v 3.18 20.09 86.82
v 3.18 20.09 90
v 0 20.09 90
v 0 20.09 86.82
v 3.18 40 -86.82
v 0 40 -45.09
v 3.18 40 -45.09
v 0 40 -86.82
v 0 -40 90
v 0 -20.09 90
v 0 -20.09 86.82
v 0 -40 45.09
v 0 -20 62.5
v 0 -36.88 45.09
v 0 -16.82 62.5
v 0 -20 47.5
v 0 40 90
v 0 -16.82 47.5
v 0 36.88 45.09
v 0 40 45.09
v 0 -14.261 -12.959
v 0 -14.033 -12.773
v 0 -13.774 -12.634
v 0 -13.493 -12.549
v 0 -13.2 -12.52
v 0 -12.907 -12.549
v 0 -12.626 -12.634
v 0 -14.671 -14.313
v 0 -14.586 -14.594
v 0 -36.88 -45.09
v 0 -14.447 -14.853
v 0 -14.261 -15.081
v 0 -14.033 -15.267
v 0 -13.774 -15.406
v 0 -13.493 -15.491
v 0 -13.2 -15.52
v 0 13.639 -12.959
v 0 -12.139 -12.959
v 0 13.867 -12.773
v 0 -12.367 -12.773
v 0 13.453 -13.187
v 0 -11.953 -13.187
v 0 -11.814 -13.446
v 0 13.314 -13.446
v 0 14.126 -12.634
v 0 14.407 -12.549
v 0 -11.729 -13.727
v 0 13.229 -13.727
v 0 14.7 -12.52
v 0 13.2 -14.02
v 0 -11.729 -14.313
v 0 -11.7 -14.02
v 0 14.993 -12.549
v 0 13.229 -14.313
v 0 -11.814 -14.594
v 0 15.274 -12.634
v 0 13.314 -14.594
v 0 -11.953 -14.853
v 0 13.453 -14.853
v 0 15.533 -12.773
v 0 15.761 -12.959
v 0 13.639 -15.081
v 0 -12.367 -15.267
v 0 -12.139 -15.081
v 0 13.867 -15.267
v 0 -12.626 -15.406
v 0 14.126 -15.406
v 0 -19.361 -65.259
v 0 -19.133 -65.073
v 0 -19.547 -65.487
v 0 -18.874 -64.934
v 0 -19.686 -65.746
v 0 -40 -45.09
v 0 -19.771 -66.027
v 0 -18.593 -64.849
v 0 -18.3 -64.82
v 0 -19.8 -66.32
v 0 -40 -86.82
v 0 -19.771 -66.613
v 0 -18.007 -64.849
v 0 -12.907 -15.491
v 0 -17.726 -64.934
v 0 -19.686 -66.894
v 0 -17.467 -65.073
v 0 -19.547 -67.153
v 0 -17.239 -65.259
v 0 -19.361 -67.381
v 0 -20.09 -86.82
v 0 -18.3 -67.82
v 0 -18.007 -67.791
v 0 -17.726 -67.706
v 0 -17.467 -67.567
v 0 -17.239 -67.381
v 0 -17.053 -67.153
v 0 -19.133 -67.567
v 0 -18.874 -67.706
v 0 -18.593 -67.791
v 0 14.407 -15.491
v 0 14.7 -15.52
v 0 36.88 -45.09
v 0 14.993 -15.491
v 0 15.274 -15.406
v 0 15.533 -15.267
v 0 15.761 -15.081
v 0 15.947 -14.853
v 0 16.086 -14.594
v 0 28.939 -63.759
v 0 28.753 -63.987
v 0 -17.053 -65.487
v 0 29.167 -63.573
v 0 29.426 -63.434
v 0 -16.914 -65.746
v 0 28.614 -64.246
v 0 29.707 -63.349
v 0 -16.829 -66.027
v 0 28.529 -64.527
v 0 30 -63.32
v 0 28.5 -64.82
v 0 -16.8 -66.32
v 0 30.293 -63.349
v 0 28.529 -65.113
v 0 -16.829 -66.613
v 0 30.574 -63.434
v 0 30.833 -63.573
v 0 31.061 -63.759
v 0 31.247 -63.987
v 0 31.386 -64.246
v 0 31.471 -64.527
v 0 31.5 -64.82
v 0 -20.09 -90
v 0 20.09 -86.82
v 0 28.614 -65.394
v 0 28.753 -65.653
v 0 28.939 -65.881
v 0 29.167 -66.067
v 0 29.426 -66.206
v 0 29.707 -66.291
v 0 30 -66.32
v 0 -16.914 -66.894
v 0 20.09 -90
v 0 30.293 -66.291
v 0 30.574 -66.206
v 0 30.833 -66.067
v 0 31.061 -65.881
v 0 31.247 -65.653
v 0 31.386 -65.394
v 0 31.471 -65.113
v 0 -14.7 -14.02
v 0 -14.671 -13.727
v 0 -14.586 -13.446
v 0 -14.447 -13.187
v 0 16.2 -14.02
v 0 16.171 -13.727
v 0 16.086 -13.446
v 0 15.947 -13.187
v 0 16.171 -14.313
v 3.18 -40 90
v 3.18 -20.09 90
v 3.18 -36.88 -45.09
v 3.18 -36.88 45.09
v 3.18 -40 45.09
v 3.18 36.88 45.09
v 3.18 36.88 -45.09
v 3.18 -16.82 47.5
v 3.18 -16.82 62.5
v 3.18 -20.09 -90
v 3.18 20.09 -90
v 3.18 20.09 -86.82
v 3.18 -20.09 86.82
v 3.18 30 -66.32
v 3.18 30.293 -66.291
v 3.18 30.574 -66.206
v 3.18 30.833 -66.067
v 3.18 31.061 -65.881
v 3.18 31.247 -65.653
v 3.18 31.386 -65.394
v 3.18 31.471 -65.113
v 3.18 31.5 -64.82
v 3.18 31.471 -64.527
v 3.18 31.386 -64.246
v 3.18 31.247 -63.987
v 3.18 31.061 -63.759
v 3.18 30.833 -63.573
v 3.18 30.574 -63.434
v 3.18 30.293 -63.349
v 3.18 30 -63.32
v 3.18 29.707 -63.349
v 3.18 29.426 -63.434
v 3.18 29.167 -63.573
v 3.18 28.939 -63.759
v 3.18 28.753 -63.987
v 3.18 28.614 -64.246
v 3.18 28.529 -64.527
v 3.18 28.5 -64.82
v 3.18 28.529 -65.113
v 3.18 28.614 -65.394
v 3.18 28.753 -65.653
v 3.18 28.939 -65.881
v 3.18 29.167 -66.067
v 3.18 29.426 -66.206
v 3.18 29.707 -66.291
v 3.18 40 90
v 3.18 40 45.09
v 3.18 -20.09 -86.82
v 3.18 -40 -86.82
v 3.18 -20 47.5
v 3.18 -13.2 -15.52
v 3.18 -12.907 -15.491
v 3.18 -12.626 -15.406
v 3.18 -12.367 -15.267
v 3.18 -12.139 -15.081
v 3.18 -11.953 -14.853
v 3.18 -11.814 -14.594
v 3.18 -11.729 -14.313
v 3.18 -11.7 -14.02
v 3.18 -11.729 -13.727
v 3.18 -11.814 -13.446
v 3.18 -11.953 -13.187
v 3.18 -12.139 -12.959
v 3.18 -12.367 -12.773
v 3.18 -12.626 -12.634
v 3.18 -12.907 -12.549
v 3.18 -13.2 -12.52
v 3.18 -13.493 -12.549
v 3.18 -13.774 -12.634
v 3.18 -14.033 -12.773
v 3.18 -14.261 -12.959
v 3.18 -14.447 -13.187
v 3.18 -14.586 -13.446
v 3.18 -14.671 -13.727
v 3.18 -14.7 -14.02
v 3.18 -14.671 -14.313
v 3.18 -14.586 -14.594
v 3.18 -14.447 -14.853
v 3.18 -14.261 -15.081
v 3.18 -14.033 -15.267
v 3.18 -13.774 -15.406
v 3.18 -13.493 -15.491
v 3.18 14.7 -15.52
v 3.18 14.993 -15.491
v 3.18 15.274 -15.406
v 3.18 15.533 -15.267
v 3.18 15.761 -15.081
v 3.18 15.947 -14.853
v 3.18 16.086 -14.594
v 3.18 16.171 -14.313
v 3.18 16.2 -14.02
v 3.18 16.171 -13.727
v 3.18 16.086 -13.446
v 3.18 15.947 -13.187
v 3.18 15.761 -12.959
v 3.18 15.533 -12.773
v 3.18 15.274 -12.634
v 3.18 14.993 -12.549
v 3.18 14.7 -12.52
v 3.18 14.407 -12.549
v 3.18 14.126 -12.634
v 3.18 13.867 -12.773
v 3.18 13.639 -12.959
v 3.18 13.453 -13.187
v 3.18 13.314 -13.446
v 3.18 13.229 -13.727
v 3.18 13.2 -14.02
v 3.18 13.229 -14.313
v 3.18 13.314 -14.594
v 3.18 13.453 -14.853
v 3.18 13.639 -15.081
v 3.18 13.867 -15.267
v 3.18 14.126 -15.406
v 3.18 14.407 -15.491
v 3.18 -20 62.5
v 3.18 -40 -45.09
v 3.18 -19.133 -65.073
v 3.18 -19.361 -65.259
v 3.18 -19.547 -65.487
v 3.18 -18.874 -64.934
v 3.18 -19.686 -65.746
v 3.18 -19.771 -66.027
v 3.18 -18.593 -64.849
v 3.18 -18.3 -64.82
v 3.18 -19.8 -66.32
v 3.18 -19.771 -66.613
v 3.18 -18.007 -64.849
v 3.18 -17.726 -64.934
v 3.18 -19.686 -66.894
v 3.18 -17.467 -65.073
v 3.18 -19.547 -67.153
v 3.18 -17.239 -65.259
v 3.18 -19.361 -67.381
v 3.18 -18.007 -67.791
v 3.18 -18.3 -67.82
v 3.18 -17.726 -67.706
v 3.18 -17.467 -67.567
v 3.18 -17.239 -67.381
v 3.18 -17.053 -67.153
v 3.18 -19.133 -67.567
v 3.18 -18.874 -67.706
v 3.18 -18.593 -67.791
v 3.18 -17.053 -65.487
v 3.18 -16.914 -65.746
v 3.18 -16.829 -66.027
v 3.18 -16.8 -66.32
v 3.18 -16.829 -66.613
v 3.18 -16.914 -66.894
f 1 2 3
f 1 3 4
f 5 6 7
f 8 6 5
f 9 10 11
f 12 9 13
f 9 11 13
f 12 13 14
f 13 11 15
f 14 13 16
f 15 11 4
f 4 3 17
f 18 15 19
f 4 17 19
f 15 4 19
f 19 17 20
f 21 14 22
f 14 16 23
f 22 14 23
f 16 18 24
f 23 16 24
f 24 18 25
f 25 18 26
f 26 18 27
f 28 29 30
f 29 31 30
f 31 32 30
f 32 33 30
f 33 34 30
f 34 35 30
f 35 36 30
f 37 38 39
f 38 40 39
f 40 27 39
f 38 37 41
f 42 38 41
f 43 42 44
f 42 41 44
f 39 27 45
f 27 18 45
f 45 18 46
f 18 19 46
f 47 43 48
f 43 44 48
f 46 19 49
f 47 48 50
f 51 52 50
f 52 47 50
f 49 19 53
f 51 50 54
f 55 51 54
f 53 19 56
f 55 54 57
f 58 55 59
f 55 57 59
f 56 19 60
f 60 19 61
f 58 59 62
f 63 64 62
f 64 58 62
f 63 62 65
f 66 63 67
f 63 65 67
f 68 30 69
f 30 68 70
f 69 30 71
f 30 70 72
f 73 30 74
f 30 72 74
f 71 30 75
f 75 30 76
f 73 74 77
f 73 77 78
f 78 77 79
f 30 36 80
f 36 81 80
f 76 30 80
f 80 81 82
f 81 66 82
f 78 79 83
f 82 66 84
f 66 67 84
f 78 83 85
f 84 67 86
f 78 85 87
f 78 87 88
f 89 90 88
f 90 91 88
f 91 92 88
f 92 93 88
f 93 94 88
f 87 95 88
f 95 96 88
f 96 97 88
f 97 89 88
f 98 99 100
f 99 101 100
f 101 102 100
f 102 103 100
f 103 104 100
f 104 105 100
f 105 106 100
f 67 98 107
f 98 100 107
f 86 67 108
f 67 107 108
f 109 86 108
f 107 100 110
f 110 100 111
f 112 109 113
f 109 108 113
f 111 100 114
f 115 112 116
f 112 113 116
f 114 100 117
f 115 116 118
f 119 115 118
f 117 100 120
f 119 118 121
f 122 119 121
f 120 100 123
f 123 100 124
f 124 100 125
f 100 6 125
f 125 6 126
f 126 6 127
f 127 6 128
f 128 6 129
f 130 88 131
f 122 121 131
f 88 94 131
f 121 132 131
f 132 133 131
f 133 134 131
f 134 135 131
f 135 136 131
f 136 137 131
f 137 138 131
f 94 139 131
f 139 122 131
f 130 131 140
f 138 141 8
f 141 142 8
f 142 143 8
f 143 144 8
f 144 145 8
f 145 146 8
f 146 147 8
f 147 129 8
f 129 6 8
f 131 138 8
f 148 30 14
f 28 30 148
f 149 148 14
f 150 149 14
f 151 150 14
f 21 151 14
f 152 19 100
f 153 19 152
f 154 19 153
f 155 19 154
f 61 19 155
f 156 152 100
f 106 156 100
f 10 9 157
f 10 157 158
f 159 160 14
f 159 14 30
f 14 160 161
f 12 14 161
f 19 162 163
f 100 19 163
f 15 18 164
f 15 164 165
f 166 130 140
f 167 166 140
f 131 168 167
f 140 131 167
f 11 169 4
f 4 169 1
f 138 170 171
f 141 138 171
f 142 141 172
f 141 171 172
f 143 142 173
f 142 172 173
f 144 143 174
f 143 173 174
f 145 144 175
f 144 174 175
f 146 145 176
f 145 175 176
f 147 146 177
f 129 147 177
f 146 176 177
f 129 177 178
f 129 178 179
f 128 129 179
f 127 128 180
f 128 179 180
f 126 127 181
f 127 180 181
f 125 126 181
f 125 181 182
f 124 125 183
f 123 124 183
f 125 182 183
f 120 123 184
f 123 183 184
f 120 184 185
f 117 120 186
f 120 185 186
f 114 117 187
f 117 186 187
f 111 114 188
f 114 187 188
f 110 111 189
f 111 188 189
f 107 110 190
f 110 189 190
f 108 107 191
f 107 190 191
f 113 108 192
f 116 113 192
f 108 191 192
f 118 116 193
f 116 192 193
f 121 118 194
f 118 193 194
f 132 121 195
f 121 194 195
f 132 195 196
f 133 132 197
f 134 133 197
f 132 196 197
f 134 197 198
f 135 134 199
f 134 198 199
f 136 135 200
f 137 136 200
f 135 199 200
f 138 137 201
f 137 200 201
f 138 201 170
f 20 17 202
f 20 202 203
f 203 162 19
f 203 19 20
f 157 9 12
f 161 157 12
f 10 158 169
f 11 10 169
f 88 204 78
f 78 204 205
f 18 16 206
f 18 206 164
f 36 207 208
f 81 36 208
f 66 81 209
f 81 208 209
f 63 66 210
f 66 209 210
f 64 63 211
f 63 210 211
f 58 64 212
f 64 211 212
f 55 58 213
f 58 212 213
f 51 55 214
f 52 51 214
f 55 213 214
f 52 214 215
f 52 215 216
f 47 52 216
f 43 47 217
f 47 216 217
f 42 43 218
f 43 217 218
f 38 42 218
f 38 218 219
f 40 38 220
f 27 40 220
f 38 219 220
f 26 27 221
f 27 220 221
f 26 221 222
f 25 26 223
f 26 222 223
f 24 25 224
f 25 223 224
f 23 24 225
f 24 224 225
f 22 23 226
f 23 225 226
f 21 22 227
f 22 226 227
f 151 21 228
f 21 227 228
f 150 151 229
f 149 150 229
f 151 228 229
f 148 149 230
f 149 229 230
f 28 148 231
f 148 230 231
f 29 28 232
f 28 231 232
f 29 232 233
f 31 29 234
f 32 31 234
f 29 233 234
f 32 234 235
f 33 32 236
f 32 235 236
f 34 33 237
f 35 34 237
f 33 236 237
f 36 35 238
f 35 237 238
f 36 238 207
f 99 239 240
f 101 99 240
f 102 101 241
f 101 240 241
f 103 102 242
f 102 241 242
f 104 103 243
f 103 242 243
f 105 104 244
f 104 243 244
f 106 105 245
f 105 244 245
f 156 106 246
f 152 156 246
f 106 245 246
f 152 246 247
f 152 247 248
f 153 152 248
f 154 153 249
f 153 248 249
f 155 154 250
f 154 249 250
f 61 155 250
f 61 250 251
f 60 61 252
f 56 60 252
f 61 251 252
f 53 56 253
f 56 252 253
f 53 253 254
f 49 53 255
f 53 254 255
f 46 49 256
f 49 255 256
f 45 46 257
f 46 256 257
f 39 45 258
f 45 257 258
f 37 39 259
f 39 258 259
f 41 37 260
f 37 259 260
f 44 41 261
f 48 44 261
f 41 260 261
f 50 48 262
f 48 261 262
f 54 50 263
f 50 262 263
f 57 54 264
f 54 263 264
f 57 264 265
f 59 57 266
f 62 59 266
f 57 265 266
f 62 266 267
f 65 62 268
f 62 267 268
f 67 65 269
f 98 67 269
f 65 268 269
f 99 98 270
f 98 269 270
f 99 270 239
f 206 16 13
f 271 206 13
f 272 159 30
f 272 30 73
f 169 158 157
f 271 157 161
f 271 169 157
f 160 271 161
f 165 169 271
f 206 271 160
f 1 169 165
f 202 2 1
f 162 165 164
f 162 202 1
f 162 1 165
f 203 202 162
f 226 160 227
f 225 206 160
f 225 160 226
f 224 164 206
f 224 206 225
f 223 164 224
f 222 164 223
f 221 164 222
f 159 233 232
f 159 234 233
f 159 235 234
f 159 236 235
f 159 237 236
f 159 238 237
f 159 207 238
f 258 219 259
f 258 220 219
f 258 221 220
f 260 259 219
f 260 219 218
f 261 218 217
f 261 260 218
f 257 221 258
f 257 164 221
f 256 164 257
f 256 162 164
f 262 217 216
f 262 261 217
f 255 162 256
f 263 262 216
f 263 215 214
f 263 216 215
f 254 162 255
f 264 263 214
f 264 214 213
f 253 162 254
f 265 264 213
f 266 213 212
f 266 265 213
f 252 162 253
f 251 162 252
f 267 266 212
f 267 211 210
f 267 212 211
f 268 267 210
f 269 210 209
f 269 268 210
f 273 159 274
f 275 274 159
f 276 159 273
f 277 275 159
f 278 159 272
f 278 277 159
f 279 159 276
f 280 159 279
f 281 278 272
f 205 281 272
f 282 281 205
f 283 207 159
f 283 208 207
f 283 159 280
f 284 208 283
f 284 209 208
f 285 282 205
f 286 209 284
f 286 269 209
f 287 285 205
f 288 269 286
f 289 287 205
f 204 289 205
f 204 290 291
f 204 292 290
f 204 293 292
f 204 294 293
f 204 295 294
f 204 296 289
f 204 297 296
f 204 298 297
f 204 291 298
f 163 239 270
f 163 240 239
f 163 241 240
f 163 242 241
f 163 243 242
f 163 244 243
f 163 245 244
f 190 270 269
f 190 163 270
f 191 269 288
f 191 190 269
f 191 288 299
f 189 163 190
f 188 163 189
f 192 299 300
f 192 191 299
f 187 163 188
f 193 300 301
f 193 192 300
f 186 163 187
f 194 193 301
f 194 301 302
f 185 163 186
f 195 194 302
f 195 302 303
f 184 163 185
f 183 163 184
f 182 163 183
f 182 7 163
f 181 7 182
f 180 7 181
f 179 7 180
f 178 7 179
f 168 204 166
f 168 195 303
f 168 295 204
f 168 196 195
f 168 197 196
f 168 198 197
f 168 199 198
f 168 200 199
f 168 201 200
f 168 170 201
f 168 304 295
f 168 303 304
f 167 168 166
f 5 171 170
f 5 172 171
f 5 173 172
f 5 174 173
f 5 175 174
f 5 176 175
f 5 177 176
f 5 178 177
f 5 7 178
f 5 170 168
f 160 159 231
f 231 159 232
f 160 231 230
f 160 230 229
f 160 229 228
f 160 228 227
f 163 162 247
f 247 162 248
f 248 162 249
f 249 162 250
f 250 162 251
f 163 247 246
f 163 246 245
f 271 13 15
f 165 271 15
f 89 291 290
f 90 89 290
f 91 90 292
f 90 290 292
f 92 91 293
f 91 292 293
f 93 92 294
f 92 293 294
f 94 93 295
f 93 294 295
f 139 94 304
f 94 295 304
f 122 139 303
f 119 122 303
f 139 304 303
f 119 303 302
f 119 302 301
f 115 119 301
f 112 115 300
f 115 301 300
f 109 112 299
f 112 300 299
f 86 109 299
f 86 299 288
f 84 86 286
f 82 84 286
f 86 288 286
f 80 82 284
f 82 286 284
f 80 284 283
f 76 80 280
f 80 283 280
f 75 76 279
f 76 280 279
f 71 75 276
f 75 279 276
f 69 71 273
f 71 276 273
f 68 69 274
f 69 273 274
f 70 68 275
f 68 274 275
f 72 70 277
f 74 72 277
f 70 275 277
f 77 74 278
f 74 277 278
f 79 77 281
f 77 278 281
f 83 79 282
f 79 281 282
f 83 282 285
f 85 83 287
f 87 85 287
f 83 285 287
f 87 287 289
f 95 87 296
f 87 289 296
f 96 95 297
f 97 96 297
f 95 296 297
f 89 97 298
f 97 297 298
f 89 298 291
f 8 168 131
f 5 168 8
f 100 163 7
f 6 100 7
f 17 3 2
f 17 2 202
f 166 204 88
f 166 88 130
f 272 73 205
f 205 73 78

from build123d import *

# Parameters (mm, degrees)
SKETCH2_W           = 180
SKETCH2_H           = 80
BOSS_EXTRUDE1_DEPTH = 3.18
SKETCH3_W           = 3.18
SKETCH3_H           = 40.18
CUT_EXTRUDE1_DEPTH  = 3.18
SKETCH4_W           = 90.18
SKETCH4_H           = 3.12
CUT_EXTRUDE2_DEPTH  = 3.18
SKETCH5_W           = 3.18
SKETCH5_H           = 19.91
CUT_EXTRUDE3_DEPTH  = 3.18
SKETCH7_R           = 1.5
CUT_EXTRUDE4_DEPTH  = 3.18
SKETCH9_W           = 15
SKETCH9_H           = 3.18
CUT_EXTRUDE6_DEPTH  = 4.18


with BuildPart() as part:
    # Sketch2 → Boss-Extrude1 (new body)
    with BuildSketch(Plane(origin=(0, 0, 0), x_dir=(0, 0, -1), z_dir=(1, 0, 0))):
        Rectangle(SKETCH2_W, SKETCH2_H)
    extrude(amount=BOSS_EXTRUDE1_DEPTH)

    # Sketch3 → Cut-Extrude1 (cut)
    with BuildSketch(Plane(origin=(3.18, 0, 0), x_dir=(0, 0, -1), z_dir=(1, 0, 0))):
        with Locations((-88.41, 0)):
            Rectangle(SKETCH3_W, SKETCH3_H)
    extrude(amount=-CUT_EXTRUDE1_DEPTH, mode=Mode.SUBTRACT)

    # Sketch4 → Cut-Extrude2 (cut)
    with BuildSketch(Plane(origin=(3.18, 0, 0), x_dir=(0, 0, -1), z_dir=(1, 0, 0))):
        with Locations((0, 38.44)):
            Rectangle(SKETCH4_W, SKETCH4_H)
    cut_extrude2 = extrude(amount=-CUT_EXTRUDE2_DEPTH, mode=Mode.SUBTRACT)

    # Mirror1: Cut-Extrude2 across plane
    add(cut_extrude2.mirror(Plane.ZX), mode=Mode.SUBTRACT)

    # Sketch5 → Cut-Extrude3 (cut)
    with BuildSketch(Plane(origin=(3.18, 0, 0), x_dir=(0, 0, -1), z_dir=(1, 0, 0))):
        with Locations((88.41, 30.045)):
            Rectangle(SKETCH5_W, SKETCH5_H)
    cut_extrude3 = extrude(amount=-CUT_EXTRUDE3_DEPTH, mode=Mode.SUBTRACT)

    # Mirror2: Cut-Extrude3 across plane
    add(cut_extrude3.mirror(Plane.ZX), mode=Mode.SUBTRACT)

    # Sketch7 → Cut-Extrude4 (cut)
    with BuildSketch(Plane(origin=(3.18, 0, 0), x_dir=(0, 0, -1), z_dir=(1, 0, 0))):
        with Locations((64.82, 30)):
            Circle(SKETCH7_R)
        with Locations((14.02, 14.7)):
            Circle(SKETCH7_R)
        with Locations((14.02, -13.2)):
            Circle(SKETCH7_R)
        with Locations((66.32, -18.3)):
            Circle(SKETCH7_R)
    extrude(amount=-CUT_EXTRUDE4_DEPTH, mode=Mode.SUBTRACT)

    # Sketch9 → Cut-Extrude6 (cut, through all)
    with BuildSketch(Plane.ZY):
        with Locations((55, -18.41)):
            Rectangle(SKETCH9_W, SKETCH9_H)
    extrude(amount=-CUT_EXTRUDE6_DEPTH, mode=Mode.SUBTRACT)


solid = part.part
